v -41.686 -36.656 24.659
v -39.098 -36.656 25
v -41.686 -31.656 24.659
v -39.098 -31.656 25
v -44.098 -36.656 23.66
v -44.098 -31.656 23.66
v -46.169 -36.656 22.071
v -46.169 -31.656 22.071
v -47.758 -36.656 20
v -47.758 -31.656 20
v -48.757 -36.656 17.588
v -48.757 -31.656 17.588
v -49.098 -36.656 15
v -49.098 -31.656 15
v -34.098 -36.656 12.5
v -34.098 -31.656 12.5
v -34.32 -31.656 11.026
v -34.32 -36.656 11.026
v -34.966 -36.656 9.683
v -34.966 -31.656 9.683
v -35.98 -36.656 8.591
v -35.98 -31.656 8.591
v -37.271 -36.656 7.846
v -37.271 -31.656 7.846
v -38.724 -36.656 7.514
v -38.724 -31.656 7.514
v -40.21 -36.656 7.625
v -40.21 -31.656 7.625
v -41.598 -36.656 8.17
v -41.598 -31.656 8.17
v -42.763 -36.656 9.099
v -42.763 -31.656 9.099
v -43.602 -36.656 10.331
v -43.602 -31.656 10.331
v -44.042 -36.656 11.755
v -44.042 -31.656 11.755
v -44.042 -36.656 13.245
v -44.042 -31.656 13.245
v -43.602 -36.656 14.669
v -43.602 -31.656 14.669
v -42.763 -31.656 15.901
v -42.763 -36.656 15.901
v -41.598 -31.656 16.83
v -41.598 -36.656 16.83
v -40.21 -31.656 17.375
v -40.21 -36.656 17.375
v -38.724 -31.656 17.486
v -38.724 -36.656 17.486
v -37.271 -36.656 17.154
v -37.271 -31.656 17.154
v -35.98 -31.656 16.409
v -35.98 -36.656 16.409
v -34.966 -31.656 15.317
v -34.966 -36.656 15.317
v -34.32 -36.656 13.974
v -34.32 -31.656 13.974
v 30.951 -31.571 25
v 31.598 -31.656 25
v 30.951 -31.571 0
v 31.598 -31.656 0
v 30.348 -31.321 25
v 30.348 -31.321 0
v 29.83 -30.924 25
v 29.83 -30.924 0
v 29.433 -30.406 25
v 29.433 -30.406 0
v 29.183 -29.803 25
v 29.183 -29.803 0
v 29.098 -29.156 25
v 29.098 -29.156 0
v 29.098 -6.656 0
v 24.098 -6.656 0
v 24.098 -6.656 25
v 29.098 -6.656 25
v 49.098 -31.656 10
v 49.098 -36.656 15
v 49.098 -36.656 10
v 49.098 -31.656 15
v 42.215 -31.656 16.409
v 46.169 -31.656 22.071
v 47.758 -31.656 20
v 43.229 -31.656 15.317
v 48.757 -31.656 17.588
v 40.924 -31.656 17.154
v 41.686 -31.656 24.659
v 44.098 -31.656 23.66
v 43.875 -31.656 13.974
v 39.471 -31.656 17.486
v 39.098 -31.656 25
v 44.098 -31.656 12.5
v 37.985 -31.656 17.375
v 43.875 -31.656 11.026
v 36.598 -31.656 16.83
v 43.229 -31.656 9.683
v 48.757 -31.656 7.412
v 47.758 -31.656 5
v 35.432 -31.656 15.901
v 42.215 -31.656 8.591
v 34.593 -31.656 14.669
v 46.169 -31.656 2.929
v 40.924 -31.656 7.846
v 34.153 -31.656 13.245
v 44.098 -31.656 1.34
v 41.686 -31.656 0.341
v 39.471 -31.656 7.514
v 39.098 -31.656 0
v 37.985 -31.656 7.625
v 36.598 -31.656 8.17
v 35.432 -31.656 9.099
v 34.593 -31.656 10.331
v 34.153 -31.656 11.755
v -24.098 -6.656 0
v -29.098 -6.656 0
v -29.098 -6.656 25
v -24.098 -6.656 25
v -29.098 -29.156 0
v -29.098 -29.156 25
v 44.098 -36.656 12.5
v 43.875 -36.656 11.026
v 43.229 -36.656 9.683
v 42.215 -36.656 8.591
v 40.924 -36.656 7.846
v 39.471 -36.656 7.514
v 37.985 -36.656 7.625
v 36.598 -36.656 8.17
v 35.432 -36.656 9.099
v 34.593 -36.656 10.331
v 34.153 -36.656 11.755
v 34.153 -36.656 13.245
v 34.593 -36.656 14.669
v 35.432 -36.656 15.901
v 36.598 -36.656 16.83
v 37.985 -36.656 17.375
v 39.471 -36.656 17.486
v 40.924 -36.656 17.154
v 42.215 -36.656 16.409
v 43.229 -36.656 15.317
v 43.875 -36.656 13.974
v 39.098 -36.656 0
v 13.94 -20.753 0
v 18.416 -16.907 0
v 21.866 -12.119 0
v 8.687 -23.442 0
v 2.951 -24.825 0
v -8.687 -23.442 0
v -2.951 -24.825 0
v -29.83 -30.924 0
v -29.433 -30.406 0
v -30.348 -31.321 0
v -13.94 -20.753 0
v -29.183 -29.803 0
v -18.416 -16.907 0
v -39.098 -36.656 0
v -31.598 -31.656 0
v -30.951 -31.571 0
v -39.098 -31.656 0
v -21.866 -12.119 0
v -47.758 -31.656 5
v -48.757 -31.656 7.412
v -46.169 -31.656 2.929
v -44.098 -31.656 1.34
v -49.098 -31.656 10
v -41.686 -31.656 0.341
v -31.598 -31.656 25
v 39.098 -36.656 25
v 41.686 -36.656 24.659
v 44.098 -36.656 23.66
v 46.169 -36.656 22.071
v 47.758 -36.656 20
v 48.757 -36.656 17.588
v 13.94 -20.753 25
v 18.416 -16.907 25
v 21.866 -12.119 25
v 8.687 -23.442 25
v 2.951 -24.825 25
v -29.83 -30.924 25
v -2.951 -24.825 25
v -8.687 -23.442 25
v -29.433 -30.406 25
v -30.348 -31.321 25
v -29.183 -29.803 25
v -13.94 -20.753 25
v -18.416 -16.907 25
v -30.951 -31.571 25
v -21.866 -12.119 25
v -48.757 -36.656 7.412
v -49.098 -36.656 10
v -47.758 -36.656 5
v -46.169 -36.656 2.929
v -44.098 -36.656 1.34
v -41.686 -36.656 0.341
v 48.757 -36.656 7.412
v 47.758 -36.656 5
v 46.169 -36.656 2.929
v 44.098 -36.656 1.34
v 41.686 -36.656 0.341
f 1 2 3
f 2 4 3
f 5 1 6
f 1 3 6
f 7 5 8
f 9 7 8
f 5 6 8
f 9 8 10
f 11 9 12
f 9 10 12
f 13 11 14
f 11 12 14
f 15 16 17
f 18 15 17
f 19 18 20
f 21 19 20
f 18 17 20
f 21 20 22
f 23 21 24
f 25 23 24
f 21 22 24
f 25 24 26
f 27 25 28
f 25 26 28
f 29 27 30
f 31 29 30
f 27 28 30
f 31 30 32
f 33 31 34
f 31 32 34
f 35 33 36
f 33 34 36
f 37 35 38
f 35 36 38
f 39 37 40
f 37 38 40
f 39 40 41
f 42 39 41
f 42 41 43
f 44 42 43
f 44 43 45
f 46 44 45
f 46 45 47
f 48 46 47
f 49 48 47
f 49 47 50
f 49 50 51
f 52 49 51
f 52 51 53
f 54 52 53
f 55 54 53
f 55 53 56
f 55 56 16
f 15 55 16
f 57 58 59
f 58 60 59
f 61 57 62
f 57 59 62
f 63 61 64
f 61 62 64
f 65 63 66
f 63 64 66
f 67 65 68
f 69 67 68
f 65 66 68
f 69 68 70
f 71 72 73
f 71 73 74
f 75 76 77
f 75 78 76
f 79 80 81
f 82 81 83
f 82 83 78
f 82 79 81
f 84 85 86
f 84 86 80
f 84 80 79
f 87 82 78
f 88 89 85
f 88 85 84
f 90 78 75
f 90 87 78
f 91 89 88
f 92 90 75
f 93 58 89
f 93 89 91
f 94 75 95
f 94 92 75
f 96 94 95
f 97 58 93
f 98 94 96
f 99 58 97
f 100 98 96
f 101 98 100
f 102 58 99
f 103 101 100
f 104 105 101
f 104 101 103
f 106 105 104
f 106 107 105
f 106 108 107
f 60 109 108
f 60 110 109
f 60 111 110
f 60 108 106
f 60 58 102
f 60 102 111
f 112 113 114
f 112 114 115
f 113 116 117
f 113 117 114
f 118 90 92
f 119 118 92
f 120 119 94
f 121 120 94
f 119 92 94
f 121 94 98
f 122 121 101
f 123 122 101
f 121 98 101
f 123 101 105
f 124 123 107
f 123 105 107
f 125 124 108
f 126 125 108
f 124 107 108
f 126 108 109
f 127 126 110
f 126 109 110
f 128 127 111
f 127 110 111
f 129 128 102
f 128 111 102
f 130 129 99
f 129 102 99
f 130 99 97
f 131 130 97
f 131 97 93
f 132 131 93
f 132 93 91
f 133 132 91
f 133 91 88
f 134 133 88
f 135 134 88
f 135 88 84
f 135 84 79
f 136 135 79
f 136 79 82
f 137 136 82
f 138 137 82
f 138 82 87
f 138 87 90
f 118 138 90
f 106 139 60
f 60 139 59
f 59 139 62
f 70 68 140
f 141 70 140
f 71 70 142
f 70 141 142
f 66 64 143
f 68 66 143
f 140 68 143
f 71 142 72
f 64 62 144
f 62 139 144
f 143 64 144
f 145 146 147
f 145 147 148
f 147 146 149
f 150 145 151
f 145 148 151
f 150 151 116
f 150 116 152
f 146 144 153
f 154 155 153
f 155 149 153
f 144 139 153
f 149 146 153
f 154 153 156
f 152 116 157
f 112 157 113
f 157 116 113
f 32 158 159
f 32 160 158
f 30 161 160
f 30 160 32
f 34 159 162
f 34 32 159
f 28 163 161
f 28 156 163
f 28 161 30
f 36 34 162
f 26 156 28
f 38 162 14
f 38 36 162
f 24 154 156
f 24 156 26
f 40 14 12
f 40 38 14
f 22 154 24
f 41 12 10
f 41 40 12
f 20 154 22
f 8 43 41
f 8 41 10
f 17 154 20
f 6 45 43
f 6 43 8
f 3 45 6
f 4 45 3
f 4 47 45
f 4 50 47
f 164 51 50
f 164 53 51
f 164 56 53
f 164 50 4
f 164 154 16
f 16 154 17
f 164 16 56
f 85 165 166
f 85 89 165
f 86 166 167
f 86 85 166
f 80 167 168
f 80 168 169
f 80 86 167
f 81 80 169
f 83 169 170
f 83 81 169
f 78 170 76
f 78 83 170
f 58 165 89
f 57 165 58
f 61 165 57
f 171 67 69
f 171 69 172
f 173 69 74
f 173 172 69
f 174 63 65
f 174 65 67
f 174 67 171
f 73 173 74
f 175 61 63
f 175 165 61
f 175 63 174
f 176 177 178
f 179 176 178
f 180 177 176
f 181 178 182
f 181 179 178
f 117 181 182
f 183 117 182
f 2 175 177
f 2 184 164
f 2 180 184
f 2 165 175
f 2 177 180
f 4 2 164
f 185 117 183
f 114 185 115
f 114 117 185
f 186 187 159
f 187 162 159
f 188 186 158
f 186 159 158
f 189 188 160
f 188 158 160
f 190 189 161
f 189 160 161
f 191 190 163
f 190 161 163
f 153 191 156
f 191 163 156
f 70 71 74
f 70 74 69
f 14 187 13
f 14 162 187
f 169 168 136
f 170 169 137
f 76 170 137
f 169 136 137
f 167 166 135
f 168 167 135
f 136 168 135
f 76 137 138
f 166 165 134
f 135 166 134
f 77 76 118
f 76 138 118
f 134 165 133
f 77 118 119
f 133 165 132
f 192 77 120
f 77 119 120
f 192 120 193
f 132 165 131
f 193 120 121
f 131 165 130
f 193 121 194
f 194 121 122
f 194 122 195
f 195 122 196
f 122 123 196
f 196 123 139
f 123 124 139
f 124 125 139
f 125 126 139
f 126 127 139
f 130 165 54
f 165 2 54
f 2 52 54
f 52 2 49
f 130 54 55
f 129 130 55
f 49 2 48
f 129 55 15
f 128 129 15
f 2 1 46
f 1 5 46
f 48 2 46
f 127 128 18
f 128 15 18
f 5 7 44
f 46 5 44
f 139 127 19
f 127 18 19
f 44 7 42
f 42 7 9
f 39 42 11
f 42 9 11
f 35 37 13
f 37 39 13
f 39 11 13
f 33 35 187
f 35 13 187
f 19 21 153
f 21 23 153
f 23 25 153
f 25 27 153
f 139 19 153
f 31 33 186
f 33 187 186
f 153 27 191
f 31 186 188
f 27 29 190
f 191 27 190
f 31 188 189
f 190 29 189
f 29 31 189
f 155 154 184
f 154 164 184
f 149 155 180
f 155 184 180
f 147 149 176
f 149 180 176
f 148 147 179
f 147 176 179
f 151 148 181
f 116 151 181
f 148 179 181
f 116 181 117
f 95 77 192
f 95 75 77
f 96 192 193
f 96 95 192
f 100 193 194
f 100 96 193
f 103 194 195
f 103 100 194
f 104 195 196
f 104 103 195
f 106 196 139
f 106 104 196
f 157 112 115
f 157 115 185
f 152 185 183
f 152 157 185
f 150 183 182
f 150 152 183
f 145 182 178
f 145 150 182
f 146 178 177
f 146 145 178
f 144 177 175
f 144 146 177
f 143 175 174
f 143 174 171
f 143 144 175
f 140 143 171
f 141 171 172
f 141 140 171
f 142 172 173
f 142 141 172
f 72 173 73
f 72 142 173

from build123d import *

# Parameters (mm, degrees)
RESSALTO_EXTRUS_O1_DEPTH = 25
ESBO_O3_W                = 25
ESBO_O3_H                = 5
RESSALTO_EXTRUS_O2_DEPTH = 20
FILETE1_R                = 10
FILETE2_R                = 10
ESBO_O4_W                = 25
ESBO_O4_H                = 5
RESSALTO_EXTRUS_O3_DEPTH = 20
FILETE3_R                = 10
FILETE4_R                = 10
ESBO_O5_R                = 5
CORTE_EXTRUS_O1_DEPTH    = 20
FILETE5_R                = 2.5
FILETE6_R                = 2.5


with BuildPart() as part:
    # Esboço2 → Ressalto-extrusão1 (new body)
    with BuildSketch(Plane.XY):
        with BuildLine():
            Line((24.097579721, -6.65632418), (29.097579721, -6.65632418))
            Line((29.097579721, -6.65632418), (29.097579721, -36.65632418))
            Line((29.097579721, -36.65632418), (-29.097579721, -36.65632418))
            Line((-29.097579721, -36.65632418), (-29.097579721, -6.65632418))
            Line((-29.097579721, -6.65632418), (-24.097579721, -6.65632418))
            ThreePointArc((-24.097579721, -6.65632418), (0, -25), (24.097579721, -6.65632418))
        make_face()
    extrude(amount=RESSALTO_EXTRUS_O1_DEPTH)

    # Esboço3 → Ressalto-extrusão2 (add)
    with BuildSketch(Plane.ZY.offset(29.097579721)):
        with Locations((12.5, -34.15632418)):
            Rectangle(ESBO_O3_W, ESBO_O3_H)
    extrude(amount=RESSALTO_EXTRUS_O2_DEPTH)

    # Filete1
    filete1_edges = [part.edges().sort_by_distance(p)[0] for p in [
        (-49.097579721, -34.15632418, 25),
    ]]
    fillet(filete1_edges, radius=FILETE1_R)

    # Filete2
    filete2_edges = [part.edges().sort_by_distance(p)[0] for p in [
        (-49.097579721, -34.15632418, 0),
    ]]
    fillet(filete2_edges, radius=FILETE2_R)

    # Esboço4 → Ressalto-extrusão3 (add)
    with BuildSketch(Plane(origin=(29.097579721, 0, 0), x_dir=(0, 0, -1), z_dir=(1, 0, 0))):
        with Locations((-12.5, -34.15632418)):
            Rectangle(ESBO_O4_W, ESBO_O4_H)
    extrude(amount=RESSALTO_EXTRUS_O3_DEPTH)

    # Filete3
    filete3_edges = [part.edges().sort_by_distance(p)[0] for p in [
        (49.097579721, -34.15632418, 25),
    ]]
    fillet(filete3_edges, radius=FILETE3_R)

    # Filete4
    filete4_edges = [part.edges().sort_by_distance(p)[0] for p in [
        (49.097579721, -34.15632418, 0),
    ]]
    fillet(filete4_edges, radius=FILETE4_R)

    # Esboço5 → Corte-extrusão1 (cut)
    with BuildSketch(Plane(origin=(0, -31.65632418, 0), x_dir=(1, 0, 0), z_dir=(0, 1, 0))):
        with Locations((39.097579721, -12.5)):
            Circle(ESBO_O5_R)
        with Locations((-39.097579721, -12.5)):
            Circle(ESBO_O5_R)
    extrude(amount=-CORTE_EXTRUS_O1_DEPTH, mode=Mode.SUBTRACT)

    # Filete5
    filete5_edges = [part.edges().sort_by_distance(p)[0] for p in [
        (-29.097579721, -31.65632418, 12.5),
    ]]
    fillet(filete5_edges, radius=FILETE5_R)

    # Filete6
    filete6_edges = [part.edges().sort_by_distance(p)[0] for p in [
        (29.097579721, -31.65632418, 12.5),
    ]]
    fillet(filete6_edges, radius=FILETE6_R)


solid = part.part
